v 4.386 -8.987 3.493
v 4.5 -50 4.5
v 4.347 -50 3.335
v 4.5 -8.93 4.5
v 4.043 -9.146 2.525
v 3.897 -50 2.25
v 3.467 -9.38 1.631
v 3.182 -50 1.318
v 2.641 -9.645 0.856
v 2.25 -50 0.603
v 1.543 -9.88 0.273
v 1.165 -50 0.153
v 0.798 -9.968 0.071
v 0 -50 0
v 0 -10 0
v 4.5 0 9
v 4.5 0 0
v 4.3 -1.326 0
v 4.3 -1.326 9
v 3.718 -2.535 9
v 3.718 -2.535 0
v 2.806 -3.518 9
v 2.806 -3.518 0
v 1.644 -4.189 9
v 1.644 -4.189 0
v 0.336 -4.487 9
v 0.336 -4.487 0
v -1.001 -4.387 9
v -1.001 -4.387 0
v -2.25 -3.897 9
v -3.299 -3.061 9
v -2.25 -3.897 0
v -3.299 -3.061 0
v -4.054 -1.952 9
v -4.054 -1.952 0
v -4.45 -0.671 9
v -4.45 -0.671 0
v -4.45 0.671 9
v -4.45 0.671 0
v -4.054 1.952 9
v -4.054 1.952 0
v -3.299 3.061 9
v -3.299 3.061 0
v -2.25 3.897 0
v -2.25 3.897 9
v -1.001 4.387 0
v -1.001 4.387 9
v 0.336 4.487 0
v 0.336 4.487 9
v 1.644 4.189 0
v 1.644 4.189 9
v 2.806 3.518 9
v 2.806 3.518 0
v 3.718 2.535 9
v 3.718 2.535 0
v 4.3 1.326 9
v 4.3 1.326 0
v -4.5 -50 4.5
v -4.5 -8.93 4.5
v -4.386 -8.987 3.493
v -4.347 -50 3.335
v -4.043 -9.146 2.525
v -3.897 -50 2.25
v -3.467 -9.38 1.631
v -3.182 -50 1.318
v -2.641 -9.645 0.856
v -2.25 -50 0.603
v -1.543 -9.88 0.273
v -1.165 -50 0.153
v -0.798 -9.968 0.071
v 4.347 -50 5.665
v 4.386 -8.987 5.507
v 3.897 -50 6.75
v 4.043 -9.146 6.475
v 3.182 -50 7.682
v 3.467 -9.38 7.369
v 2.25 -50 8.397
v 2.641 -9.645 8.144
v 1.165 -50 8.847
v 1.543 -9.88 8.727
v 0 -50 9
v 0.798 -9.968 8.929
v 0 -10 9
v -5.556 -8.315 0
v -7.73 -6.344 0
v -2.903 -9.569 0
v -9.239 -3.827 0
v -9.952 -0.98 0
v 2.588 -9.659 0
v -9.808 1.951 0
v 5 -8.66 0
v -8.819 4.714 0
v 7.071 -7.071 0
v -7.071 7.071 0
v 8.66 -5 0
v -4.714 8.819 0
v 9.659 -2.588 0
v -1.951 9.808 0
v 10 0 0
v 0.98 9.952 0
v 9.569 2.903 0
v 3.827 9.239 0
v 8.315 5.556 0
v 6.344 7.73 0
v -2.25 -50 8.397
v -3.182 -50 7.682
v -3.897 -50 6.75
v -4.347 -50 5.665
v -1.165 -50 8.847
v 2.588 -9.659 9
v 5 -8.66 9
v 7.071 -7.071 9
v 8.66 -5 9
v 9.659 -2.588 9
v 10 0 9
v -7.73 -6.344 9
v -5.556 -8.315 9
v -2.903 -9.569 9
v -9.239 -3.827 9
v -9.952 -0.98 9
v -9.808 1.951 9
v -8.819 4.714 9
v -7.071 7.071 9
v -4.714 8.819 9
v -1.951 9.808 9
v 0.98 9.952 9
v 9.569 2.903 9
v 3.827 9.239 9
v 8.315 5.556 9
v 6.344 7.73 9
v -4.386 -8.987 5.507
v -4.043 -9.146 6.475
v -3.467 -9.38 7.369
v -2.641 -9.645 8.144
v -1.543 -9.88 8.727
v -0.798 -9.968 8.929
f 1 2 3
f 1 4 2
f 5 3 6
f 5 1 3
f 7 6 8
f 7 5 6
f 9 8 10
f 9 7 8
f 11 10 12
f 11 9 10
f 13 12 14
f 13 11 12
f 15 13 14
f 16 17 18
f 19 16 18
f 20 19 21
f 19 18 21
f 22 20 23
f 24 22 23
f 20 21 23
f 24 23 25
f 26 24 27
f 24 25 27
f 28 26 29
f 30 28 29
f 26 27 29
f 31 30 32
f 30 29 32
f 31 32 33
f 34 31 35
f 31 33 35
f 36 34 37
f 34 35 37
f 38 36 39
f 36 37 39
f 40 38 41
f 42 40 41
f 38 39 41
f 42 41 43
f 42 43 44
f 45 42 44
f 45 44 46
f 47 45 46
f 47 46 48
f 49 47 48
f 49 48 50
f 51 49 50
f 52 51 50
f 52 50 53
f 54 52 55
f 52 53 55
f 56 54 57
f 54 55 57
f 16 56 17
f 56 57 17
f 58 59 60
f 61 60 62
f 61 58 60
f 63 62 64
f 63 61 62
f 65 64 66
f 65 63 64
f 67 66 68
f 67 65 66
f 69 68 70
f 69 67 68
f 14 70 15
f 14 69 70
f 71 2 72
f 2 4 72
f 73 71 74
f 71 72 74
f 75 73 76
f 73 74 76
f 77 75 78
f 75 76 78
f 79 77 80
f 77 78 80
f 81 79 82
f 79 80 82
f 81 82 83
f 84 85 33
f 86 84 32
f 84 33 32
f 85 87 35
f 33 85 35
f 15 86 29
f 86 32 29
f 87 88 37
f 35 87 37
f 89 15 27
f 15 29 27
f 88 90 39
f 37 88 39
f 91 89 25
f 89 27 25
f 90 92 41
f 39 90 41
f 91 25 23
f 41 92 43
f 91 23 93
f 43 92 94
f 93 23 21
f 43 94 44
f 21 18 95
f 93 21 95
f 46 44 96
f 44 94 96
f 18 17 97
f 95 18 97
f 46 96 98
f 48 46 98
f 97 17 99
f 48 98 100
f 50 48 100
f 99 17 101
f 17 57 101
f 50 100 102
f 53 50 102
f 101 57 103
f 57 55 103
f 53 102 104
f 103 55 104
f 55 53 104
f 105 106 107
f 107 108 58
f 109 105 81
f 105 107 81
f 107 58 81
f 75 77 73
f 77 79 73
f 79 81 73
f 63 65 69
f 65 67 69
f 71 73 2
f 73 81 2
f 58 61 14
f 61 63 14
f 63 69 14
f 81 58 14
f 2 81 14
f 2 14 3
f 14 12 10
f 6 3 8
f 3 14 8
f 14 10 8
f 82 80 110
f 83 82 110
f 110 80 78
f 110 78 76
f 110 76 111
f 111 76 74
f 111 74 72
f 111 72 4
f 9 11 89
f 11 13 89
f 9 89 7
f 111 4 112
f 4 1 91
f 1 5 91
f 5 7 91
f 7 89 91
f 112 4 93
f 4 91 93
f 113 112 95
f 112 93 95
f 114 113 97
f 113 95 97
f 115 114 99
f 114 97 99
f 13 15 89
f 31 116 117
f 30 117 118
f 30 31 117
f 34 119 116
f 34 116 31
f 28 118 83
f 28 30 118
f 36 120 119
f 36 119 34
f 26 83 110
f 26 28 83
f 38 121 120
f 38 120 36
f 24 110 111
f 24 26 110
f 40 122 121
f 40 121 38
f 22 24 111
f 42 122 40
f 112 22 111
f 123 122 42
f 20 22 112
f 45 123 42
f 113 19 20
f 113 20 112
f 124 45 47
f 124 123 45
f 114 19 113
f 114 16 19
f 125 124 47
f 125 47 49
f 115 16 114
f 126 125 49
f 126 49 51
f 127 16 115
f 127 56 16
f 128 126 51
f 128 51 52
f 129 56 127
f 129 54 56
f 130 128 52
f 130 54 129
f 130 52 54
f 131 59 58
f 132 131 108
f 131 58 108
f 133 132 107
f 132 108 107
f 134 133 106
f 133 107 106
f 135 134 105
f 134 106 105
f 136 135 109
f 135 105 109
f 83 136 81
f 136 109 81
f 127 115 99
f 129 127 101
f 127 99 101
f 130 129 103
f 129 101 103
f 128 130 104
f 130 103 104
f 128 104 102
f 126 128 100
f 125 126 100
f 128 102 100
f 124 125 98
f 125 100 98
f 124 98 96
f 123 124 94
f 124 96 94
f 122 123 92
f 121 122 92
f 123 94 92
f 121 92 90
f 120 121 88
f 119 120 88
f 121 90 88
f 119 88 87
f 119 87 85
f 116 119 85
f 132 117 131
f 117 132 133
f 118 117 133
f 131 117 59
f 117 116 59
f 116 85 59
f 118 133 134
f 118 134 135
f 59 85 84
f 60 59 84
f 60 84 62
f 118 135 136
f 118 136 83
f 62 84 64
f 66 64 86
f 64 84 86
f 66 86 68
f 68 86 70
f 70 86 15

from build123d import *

# Parameters (mm, degrees)
F1_DEPTH = 9
F2_R     = 4.49999


# Not quite as in the source:
# - a fillet or chamfer is up to 0.001 mm smaller than in the source, because OpenCascade refuses the exact size


with BuildPart() as f1:
    # F0 (on Top) → F1 (new body)
    with BuildSketch(Plane.XY):
        with BuildLine():
            ThreePointArc((4.5, -8.9302855497), (8.514693183, -5.2440442409), (10, 0))
            ThreePointArc((10, 0), (-5.2440442409, 8.514693183), (-4.5, -8.9302855497))
            Line((-4.5, -8.9302855497), (-4.5, 0))
            ThreePointArc((-4.5, 0), (0, 4.5), (4.5, 0))
            Line((4.5, 0), (4.5, -8.9302855497))
        make_face()
        with BuildLine():
            Line((-4.5, 0), (-4.5, -8.9302855497))
            ThreePointArc((-4.5, -8.9302855497), (0, -10), (4.5, -8.9302855497))
            Line((4.5, -8.9302855497), (4.5, 0))
            ThreePointArc((4.5, 0), (0, -4.5), (-4.5, 0))
        make_face()
        with BuildLine():
            ThreePointArc((4.5, -8.9302855497), (0, -10), (-4.5, -8.9302855497))
            Line((-4.5, -8.9302855497), (-4.5, -50))
            Line((-4.5, -50), (4.5, -50))
            Line((4.5, -50), (4.5, -8.9302855497))
        make_face()
    extrude(amount=F1_DEPTH)

    # F2 (radius 4.5 in the source; OpenCascade refuses exactly that, so slightly less here)
    f2_edges = [f1.edges().sort_by_distance(p)[0] for p in [
        (-4.5, -29.465143, 9),
        (4.5, -29.465143, 9),
        (4.5, -29.465143, 0),
        (-4.5, -29.465143, 0),
    ]]
    fillet(f2_edges, radius=F2_R)


solid = f1.part
